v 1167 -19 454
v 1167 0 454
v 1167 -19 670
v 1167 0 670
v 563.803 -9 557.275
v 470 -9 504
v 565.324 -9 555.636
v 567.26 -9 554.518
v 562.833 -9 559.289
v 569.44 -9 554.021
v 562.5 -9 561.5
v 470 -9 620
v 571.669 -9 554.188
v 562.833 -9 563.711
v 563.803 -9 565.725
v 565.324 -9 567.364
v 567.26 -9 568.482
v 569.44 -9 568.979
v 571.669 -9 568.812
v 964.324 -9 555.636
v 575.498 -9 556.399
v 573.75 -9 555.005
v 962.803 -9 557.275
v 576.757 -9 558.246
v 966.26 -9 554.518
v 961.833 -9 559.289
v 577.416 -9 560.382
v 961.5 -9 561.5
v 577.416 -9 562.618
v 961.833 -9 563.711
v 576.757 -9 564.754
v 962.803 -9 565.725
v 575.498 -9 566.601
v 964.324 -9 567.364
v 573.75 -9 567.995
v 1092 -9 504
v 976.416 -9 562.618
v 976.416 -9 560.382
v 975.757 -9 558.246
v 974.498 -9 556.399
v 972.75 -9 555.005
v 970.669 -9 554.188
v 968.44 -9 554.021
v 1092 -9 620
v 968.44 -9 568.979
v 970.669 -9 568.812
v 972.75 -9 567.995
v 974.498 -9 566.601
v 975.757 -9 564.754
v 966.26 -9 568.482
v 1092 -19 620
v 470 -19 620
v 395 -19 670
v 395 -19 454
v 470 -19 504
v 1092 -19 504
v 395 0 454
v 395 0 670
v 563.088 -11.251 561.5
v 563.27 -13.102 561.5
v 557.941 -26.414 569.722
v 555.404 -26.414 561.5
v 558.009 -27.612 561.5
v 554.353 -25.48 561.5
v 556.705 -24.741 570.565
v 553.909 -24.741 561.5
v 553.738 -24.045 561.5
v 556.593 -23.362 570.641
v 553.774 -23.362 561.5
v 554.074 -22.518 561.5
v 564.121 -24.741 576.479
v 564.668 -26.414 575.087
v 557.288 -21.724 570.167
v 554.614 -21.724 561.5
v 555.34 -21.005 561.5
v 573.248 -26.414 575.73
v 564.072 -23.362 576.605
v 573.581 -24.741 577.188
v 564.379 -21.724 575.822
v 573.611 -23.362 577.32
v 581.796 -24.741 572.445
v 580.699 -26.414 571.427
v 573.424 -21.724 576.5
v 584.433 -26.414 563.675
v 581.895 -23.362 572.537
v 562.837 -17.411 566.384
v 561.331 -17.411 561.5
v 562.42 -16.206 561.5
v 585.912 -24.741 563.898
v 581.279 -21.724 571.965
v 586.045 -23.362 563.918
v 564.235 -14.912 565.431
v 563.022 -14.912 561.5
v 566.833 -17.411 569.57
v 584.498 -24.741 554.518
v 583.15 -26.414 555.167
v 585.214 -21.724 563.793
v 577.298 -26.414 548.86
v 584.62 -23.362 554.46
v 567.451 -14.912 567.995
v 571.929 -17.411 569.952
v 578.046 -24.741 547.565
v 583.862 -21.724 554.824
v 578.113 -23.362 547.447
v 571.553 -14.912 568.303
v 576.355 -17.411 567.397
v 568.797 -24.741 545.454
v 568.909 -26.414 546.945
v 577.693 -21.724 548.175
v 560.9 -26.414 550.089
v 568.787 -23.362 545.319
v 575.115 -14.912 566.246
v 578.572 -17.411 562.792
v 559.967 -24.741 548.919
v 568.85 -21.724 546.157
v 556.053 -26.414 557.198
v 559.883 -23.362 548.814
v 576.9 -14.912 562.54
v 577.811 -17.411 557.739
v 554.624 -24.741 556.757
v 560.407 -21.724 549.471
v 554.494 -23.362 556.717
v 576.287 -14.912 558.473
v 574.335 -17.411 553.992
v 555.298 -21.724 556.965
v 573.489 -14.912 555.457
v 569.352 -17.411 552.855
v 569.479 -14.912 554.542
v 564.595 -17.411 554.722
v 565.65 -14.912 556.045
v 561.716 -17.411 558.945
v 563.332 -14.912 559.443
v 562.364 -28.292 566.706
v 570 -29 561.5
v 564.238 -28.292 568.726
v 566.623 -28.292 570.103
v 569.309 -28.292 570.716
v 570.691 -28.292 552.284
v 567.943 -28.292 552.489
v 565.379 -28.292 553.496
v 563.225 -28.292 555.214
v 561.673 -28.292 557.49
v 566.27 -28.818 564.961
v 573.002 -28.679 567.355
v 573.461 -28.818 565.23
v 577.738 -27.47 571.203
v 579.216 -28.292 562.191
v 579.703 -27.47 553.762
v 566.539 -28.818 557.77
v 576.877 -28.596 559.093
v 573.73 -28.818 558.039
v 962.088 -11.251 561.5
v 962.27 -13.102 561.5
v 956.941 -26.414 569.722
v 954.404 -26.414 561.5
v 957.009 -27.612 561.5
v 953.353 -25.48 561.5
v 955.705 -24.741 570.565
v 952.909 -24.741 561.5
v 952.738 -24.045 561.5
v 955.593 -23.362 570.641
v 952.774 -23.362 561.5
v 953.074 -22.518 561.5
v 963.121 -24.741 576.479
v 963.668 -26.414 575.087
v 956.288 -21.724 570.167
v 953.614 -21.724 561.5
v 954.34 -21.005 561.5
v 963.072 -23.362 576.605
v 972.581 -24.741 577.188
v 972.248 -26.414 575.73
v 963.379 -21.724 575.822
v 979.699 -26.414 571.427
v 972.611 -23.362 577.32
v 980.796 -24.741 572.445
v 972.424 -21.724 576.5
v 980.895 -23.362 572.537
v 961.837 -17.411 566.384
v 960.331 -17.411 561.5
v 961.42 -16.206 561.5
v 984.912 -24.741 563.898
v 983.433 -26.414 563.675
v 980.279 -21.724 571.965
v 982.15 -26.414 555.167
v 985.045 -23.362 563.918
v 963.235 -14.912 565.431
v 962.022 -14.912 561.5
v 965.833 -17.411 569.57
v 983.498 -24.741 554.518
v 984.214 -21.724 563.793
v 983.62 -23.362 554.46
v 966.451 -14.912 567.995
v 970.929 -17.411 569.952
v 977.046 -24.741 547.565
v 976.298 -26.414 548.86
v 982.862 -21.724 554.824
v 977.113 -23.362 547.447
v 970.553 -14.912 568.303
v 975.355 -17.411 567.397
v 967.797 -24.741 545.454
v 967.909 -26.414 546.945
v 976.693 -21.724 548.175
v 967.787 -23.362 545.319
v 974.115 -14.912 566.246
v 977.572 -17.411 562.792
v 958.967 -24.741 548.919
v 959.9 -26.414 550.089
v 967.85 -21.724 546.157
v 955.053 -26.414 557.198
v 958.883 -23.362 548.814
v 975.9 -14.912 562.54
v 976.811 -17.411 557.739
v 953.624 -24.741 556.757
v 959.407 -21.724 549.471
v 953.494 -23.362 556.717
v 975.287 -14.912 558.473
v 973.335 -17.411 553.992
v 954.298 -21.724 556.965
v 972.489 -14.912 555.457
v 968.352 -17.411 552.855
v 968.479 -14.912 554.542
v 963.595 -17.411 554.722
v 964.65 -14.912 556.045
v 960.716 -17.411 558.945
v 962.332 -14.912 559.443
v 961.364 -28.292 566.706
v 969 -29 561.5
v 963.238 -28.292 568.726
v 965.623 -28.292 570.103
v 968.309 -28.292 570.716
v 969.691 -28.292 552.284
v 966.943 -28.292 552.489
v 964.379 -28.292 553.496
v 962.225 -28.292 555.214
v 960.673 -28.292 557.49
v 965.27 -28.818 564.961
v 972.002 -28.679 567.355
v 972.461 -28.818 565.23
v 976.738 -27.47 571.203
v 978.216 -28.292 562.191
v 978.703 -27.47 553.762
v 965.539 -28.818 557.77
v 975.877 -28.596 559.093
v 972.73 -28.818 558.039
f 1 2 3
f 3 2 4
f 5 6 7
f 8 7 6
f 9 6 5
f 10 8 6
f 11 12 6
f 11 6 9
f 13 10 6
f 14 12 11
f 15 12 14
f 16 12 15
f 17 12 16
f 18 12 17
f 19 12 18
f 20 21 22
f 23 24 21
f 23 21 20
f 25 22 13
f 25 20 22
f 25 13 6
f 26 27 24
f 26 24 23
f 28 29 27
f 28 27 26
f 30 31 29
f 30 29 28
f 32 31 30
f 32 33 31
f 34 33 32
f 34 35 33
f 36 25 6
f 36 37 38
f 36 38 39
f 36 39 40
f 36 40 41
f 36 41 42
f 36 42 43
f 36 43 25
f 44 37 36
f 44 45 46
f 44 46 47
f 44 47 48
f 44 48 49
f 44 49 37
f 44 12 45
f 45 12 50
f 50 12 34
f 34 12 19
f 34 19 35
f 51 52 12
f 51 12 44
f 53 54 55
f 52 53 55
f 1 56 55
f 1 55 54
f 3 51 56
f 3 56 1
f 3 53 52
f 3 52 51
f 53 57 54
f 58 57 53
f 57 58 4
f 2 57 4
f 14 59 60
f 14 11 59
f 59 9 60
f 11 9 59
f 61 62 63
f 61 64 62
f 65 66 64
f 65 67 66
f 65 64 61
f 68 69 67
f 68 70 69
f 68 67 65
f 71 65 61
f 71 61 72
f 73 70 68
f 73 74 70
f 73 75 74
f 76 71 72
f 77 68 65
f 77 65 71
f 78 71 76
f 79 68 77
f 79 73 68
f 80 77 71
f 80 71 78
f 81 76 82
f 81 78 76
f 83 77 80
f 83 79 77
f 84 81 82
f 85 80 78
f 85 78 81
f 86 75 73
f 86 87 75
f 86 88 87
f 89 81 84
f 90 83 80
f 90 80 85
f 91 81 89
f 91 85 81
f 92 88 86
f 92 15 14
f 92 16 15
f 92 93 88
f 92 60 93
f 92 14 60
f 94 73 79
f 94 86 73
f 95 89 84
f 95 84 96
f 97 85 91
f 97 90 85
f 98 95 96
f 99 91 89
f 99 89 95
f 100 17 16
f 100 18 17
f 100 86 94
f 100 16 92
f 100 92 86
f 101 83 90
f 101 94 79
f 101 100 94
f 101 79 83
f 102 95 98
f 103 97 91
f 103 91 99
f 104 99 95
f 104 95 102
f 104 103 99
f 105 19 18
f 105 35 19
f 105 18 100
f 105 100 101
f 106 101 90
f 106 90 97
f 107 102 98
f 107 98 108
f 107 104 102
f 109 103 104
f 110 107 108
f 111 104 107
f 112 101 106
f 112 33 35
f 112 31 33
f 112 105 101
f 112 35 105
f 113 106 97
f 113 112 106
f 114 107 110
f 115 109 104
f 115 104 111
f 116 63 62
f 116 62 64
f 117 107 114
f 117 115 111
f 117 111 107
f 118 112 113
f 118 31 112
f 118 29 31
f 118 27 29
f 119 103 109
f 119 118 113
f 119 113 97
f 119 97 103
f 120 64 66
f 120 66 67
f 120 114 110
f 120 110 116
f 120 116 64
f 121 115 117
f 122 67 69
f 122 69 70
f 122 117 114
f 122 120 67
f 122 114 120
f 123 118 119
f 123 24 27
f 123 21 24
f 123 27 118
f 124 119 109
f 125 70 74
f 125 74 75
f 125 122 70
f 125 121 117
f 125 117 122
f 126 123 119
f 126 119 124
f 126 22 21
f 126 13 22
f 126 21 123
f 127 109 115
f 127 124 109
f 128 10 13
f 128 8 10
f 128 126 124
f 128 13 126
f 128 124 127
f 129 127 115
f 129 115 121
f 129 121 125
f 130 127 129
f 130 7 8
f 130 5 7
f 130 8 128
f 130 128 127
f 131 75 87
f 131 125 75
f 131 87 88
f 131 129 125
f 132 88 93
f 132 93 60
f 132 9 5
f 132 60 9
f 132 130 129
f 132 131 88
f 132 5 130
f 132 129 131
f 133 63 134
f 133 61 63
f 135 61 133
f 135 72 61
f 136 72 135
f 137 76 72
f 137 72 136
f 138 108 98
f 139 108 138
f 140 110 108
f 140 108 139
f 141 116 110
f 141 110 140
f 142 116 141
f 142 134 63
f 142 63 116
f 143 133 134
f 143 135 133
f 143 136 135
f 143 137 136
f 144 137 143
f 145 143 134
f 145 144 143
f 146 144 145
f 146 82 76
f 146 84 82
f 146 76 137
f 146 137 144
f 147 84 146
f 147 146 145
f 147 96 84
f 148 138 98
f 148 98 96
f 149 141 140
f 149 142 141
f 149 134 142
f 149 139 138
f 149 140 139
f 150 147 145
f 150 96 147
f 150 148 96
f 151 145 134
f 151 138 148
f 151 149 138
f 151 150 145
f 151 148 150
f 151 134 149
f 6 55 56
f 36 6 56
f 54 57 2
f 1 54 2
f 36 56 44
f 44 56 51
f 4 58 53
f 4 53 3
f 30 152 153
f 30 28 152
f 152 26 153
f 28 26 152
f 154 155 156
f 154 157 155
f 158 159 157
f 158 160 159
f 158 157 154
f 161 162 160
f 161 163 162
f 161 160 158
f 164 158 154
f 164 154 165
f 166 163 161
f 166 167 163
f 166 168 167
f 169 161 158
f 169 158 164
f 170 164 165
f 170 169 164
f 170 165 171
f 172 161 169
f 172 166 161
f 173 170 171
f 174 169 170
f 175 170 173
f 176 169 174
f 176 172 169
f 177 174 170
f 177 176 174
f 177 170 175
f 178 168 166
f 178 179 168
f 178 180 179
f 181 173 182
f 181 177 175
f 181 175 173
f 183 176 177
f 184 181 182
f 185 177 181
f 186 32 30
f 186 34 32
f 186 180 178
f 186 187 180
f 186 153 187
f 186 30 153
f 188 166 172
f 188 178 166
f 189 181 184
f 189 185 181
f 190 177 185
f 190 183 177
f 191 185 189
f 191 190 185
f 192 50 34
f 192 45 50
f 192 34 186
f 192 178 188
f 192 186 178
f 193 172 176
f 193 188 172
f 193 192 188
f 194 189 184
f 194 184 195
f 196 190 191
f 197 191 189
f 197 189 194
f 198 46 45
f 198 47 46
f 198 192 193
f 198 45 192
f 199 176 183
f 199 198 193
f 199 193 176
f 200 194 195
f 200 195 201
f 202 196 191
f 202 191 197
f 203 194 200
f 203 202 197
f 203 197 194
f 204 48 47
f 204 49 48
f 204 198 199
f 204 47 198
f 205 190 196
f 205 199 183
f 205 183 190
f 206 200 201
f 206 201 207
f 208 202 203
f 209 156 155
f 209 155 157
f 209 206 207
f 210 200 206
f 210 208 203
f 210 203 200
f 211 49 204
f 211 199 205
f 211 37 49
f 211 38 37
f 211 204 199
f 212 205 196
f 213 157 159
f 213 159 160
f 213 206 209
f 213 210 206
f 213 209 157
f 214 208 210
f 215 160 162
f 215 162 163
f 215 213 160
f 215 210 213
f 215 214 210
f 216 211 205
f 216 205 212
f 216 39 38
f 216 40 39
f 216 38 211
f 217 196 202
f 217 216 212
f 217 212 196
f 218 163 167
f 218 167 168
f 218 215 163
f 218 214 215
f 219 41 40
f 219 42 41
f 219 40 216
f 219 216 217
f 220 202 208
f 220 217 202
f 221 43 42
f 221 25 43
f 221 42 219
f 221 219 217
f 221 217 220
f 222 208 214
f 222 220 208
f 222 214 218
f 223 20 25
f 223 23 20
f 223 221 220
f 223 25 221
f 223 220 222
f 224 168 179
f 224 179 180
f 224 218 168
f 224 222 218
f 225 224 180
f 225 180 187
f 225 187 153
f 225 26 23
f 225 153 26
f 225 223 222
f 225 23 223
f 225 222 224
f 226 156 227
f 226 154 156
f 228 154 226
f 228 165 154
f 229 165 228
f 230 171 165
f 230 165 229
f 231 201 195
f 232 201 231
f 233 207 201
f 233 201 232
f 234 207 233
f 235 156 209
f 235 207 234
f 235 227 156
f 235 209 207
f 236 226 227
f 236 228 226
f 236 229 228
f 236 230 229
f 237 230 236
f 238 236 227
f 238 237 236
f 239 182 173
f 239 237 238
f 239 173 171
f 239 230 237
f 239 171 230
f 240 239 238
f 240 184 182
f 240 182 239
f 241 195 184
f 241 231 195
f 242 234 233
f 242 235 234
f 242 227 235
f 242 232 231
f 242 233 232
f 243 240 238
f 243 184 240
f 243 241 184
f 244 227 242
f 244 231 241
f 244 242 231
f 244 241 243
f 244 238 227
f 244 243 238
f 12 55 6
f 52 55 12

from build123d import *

# Parameters (mm, degrees)
CLONE2D004_W    = 772
CLONE2D004_H    = 216
PAD012_DEPTH    = 19
SKETCH029_W     = 622
SKETCH029_H     = 116
POCKET012_DEPTH = 10


with BuildPart() as part:
    # Clone2D004 → Pad012 (new body)
    with BuildSketch(Plane.XZ):
        with Locations((386, 108)):
            Rectangle(CLONE2D004_W, CLONE2D004_H)
    extrude(amount=PAD012_DEPTH)

    # Sketch029 (on Face6 of Pad012) → Pocket012 (cut)
    with BuildSketch(Plane.XZ.offset(19)):
        with Locations((386, 108)):
            Rectangle(SKETCH029_W, SKETCH029_H)
    extrude(amount=-POCKET012_DEPTH, mode=Mode.SUBTRACT)

    # Clone2D005 → Revolution002 (revolve)
    with BuildSketch(Plane(origin=(175, -9, 107.5), x_dir=(1, 0, 0), z_dir=(0, 0, 1))):
        with BuildLine():
            Line((0, 0), (0, -20))
            add(Edge.make_bspline(
                [(0, -20), (-18, -20), (-18, -9.133286), (-4.506424, -9.133286), (-7.5, 0)],
                knots=[0, 0, 0, 0, 0.5, 1, 1, 1, 1], degree=3, weights=[7, 6.116989, 5.810816, 6.060123, 5.999522]))
            Line((-7.5, 0), (0, 0))
        make_face()
    revolve(axis=Axis((175, -9, 107.5), (0, 1, 0)))

    # Clone2D006 → Revolution003 (revolve)
    with BuildSketch(Plane(origin=(574, -9, 107.5), x_dir=(1, 0, 0), z_dir=(0, 0, 1))):
        with BuildLine():
            Line((0, 0), (0, -20))
            add(Edge.make_bspline(
                [(0, -20), (-18, -20), (-18, -9.133286), (-4.506424, -9.133286), (-7.5, 0)],
                knots=[0, 0, 0, 0, 0.5, 1, 1, 1, 1], degree=3, weights=[7, 6.116989, 5.810816, 6.060123, 5.999522]))
            Line((-7.5, 0), (0, 0))
        make_face()
    revolve(axis=Axis((574, -9, 107.5), (0, 1, 0)))


with BuildPart() as part_1:
    # Body012 placement: moved
    add(part.part.moved(Location((394, 0, 10))))


with BuildPart() as part_2:
    # Clone placement: moved
    add(part_1.part.moved(Location((-393, 0, -10))))


with BuildPart() as part_3:
    # Body013 placement: moved
    add(part_2.part.moved(Location((394, 0, 454))))


solid = part_3.part
